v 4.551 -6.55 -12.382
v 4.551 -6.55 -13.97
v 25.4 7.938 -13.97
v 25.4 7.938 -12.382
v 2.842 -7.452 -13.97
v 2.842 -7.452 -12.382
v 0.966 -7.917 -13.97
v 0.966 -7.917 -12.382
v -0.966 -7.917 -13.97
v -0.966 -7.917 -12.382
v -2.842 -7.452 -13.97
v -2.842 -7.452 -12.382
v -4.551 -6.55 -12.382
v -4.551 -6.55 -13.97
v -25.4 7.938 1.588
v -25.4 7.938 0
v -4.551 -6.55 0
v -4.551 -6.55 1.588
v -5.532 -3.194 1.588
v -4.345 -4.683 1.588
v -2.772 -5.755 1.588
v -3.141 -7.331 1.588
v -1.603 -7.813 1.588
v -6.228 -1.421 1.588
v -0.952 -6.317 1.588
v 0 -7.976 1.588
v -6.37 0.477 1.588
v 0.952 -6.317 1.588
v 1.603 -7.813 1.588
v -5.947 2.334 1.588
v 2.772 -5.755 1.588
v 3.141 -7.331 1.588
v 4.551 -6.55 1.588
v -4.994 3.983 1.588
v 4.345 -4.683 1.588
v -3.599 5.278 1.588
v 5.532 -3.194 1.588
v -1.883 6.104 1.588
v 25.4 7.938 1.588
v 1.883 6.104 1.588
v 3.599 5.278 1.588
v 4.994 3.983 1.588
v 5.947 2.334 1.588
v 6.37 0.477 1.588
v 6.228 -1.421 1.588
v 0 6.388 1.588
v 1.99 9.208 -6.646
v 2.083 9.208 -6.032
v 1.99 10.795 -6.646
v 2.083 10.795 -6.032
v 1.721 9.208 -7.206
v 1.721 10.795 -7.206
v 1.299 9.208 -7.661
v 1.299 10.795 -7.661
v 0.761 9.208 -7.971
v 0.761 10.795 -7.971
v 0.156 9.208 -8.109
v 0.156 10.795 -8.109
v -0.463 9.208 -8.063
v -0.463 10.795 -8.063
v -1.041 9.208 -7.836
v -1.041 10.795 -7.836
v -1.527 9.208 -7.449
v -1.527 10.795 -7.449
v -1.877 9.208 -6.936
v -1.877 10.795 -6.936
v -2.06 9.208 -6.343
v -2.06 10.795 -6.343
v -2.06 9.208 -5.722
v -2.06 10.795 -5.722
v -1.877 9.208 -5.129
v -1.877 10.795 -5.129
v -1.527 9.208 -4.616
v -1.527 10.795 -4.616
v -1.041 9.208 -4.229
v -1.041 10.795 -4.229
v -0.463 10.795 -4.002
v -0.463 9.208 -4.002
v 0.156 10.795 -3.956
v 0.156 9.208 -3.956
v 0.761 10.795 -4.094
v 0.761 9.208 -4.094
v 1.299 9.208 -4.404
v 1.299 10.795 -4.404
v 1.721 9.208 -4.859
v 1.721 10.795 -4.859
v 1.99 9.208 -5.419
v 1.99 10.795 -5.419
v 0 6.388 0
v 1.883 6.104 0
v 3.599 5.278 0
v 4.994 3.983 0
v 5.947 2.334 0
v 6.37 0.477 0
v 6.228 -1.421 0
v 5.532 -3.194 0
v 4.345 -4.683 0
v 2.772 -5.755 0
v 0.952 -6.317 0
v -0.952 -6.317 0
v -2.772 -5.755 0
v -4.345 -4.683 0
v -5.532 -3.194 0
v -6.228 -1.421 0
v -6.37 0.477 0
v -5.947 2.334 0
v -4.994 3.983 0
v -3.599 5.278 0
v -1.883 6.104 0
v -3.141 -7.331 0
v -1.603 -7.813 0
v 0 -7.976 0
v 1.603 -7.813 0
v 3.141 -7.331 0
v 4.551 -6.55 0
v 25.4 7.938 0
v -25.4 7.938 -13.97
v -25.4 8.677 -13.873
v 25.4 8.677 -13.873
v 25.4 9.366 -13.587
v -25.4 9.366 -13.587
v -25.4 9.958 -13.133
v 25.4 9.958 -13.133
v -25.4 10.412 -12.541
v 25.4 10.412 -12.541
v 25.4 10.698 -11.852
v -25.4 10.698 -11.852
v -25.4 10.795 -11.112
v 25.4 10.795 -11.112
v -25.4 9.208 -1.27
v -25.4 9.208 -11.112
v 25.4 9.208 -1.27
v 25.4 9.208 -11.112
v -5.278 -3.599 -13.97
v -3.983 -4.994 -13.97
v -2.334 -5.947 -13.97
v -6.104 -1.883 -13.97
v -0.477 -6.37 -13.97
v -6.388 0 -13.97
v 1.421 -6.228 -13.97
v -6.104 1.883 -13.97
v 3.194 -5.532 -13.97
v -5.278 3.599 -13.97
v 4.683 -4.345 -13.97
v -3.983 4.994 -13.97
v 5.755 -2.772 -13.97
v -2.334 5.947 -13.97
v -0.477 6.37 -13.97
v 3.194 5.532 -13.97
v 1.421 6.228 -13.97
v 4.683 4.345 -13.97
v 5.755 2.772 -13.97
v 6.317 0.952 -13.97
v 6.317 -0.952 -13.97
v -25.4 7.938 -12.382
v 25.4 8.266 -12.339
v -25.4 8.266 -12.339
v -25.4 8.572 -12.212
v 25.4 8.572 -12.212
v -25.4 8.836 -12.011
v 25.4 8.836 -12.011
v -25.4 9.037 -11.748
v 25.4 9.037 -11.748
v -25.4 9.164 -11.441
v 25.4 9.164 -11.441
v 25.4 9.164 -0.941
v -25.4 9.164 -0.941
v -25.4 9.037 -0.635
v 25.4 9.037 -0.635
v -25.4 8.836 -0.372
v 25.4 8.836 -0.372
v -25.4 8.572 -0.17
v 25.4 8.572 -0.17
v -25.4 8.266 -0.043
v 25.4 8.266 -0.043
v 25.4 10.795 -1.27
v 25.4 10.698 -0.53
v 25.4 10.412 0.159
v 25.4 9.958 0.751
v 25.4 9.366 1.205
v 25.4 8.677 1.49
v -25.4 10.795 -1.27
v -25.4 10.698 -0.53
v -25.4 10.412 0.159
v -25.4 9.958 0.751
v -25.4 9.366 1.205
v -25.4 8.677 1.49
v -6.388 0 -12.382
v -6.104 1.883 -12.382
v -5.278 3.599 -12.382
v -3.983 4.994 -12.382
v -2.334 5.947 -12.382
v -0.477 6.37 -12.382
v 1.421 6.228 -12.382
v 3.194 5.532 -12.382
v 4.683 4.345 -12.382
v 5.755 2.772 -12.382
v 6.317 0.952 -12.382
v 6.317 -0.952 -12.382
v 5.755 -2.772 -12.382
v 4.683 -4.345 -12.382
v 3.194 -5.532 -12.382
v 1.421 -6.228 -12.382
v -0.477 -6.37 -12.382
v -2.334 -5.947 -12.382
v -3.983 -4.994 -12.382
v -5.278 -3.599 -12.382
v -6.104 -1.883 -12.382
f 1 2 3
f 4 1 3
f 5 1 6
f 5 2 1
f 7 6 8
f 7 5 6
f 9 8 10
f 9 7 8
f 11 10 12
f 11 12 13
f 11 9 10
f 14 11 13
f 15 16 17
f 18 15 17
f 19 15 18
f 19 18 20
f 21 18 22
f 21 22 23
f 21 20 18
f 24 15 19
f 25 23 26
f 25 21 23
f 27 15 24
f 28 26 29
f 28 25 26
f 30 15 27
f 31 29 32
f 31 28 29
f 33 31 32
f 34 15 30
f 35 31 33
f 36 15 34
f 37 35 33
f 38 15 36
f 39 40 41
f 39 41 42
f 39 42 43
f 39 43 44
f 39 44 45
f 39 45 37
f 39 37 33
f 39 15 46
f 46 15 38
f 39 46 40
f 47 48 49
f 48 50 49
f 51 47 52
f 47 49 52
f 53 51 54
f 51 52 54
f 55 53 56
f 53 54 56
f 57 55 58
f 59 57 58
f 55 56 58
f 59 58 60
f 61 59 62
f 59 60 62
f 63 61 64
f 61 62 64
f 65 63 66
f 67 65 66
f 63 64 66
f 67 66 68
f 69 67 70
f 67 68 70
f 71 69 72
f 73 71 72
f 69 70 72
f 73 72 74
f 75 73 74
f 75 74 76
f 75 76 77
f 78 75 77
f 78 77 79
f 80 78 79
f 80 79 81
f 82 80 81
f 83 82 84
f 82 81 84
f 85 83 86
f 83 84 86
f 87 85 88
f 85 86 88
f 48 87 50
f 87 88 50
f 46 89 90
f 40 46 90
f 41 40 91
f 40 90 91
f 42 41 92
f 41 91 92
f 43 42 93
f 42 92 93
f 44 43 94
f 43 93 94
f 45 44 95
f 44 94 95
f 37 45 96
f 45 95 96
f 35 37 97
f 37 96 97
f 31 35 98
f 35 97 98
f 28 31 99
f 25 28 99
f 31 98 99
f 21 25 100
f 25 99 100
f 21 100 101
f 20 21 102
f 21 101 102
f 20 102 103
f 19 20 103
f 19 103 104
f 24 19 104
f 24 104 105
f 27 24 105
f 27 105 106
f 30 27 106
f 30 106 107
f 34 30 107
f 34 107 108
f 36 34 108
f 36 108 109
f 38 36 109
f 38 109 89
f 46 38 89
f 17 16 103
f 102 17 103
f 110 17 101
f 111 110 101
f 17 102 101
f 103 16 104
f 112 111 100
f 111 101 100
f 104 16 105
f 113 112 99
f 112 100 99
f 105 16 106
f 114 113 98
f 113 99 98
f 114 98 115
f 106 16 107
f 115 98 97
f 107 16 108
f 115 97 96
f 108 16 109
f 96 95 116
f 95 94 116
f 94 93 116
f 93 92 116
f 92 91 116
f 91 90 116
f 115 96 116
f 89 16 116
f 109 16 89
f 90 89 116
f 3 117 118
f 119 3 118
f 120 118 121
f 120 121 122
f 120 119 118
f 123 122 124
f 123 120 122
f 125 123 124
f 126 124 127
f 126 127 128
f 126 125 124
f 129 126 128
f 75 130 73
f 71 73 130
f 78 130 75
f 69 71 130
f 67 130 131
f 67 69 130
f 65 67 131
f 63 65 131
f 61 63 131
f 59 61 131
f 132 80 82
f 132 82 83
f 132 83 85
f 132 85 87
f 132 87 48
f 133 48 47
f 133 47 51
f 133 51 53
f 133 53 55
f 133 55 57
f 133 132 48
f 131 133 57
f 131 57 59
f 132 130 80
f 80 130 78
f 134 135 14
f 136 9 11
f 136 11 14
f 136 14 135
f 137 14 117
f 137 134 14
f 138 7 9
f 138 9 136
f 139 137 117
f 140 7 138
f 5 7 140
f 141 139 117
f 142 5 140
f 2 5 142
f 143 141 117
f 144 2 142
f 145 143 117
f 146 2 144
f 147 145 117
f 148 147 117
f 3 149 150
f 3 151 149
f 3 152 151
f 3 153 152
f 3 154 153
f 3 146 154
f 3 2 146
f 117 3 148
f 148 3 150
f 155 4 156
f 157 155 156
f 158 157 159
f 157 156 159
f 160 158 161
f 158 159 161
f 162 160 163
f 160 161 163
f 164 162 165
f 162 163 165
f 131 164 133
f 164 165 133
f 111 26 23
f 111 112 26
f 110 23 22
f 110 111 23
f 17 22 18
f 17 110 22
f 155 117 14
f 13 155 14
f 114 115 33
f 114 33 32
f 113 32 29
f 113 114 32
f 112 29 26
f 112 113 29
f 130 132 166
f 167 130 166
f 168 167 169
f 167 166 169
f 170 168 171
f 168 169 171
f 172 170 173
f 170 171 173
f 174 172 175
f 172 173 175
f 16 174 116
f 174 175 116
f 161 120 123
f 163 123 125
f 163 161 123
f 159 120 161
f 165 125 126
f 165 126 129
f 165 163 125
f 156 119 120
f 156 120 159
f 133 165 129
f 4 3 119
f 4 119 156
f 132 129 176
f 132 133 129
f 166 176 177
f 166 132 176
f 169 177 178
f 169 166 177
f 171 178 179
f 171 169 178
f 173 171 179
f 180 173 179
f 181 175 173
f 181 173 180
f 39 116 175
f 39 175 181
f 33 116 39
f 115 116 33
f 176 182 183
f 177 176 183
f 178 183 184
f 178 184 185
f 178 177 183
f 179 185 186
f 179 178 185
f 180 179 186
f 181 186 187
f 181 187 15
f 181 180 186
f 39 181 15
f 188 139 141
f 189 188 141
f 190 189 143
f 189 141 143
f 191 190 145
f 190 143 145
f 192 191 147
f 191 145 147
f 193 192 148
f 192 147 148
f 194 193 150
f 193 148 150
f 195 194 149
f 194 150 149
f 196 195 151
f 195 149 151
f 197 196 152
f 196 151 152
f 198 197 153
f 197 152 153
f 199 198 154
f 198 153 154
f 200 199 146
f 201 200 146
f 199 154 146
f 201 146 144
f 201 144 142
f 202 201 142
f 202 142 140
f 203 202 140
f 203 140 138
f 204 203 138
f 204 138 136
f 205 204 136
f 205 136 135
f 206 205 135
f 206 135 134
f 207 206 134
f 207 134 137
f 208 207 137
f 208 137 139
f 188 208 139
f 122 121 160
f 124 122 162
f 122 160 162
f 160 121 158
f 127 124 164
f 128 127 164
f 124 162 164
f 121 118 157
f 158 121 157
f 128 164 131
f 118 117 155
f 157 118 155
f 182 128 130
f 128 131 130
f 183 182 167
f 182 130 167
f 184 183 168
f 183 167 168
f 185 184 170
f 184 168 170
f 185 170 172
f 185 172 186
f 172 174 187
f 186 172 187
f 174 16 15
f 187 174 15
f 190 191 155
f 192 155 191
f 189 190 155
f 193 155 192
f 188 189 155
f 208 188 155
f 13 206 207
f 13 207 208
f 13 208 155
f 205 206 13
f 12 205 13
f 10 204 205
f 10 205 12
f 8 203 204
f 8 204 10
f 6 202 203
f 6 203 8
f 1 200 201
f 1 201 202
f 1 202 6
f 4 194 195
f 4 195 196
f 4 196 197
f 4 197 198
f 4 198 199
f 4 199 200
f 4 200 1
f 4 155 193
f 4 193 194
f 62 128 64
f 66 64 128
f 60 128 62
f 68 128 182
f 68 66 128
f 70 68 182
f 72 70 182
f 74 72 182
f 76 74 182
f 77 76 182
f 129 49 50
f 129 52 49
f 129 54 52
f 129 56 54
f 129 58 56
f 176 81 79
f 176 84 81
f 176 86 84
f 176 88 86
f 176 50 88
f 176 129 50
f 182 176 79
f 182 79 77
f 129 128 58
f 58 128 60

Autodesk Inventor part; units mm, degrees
ref_plane "YZ Plane" through (0, 0, 0) normal (1, 0, 0) x (0, 1, 0)
ref_plane "XZ Plane" through (0, 0, 0) normal (0, 1, 0) x (-1, 0, 0)
ref_plane "XY Plane" through (0, 0, 0) normal (0, 0, 1) x (1, 0, 0)
sketch "Sketch1" plane through (0, 0, 0) normal (0, 0, 1) x (1, 0, 0)
  arc A0 (0, 6.3881) -> (0, -6.3881) centre (0, 0) ccw
  line L0 (-25.4, 7.9375) -> (-4.5511, -6.5496)
  line L1 (0, 7.9375) -> (0, -13.1033) construction
  line L2 (-25.4, 7.9375) -> (0, 7.9375)
  arc A1 (-4.5511, -6.5496) -> (0, -7.9756) centre (0, 0) ccw
  arc A2 (0, -6.3881) -> (0, 6.3881) centre (0, 0) ccw
  line L3 (25.4, 7.9375) -> (4.5511, -6.5496)
  line L4 (25.4, 7.9375) -> (0, 7.9375)
  arc A3 (0, -7.9756) -> (4.5511, -6.5496) centre (0, 0) ccw
  dimension "d0" = 12.7762
  dimension "d1" = 7.9375
  dimension "d2" = 25.4
  dimension "d3" = 1.5875
extrude "Plate1" add sketch "Sketch1" along normal blind 1.5875
sketch "Sketch2" plane through (25.4, 9.2075, -1.27) normal (0, 1, 0) x (-1, 0, 0)
  line L0 (50.8, 0) -> (0, 0)
  line L1 (0, 0) -> (0, -9.8425)
  line L2 (0, -9.8425) -> (50.8, -9.8425)
  line L3 (50.8, -9.8425) -> (50.8, 0)
edge flange "Flange1" height 12.7 angle 90 thickness 1.5875 bend radius 1.27 thickness toward (0, 1, 0) relief tear relief width 1.5875 relief depth 0.7937 edges at (-12.7, 7.9375, 0) wall of the first edge with corners at (-25.4, 9.2075, -1.27) (25.4, 9.2075, -1.27) (25.4, 9.2075, -11.1125) (-25.4, 9.2075, -11.1125)
bend "Bend1"
corner "Corner1"
sketch "Sketch3" plane through (-25.4, 10.795, -11.1125) normal (0, 1, 0) x (1, 0, 0)
  line L0 (0, -9.8425) -> (50.8, -9.8425) projected
  line L1 (50.8, 0) -> (50.8, -9.8425) projected
  line L2 (25.4, -6.2418) -> (25.4, -0.3175) construction
  circle A0 centre (25.4, -5.08) radius 2.0828
  dimension "d35" = 4.1656
  dimension "d36" = 4.7625
  dimension "d37" = 25.4
extrude "Cut1" cut sketch "Sketch3" against normal blind 1.5875
sketch "Sketch4" plane through (25.4, 7.9375, -12.3825) normal (0, 0, -1) x (-1, 0, 0)
  line L0 (50.8, 0) -> (0, 0)
  line L1 (0, 0) -> (0, -16.2306)
  line L2 (0, -16.2306) -> (50.8, -16.2306)
  line L3 (50.8, -16.2306) -> (50.8, 0)
edge flange "Flange2" height 19.0881 angle 90 thickness 1.5875 bend radius 1.27 thickness toward (0, 0, -1) relief tear relief width 1.5875 relief depth 0.7937 edges at (0, 9.2075, -11.1125) wall of the first edge with corners at (-25.4, 7.9375, -12.3825) (25.4, 7.9375, -12.3825) (25.4, -8.2931, -12.3825) (-25.4, -8.2931, -12.3825)
bend "Bend2"
corner "Corner2"
sketch "Sketch5" plane through (25.4, -8.2931, -13.97) normal (0, 0, -1) x (-1, 0, 0)
  line L0 (50.8, 16.2306) -> (0, 16.2306) projected
  line L1 (0, 0) -> (0, 16.2306) projected
  line L2 (50.8, 0) -> (0, 0) projected
  line L3 (50.8, 16.2306) -> (50.8, 0) projected
  circle A0 centre (25.4, 8.2931) radius 6.3881 projected
  line L4 (50.8, 16.2306) -> (29.9511, 1.7435) projected
  line L5 (0, 16.2306) -> (50.8, 16.2306) projected
  line L6 (20.8489, 1.7435) -> (0, 16.2306) projected
  arc A1 (20.8489, 1.7435) -> (29.9511, 1.7435) centre (25.4, 8.2931) ccw projected
extrude "Cut2" cut sketch "Sketch5" against normal blind 1.5875 contours L3 L2 L1 L6 A1 L4 | A0
equation "\"d37\" = d2"
equation "\"d18\" = Thickness"
equation "\"d49\" = Thickness"
equation "\"d5\" = BendReliefWidth"
equation "\"d6\" = BendReliefDepth"
equation "\"d7\" = MinimumRemnant"
equation "\"d8\" = BendRadius"
equation "\"d12\" = CornerReliefSize"
equation "\"d13\" = GapSize"
equation "\"d14\" = JacobiRadiusSize"
equation "\"d39\" = BendReliefWidth"
equation "\"d40\" = BendReliefDepth"
equation "\"d41\" = MinimumRemnant"
equation "\"d42\" = BendRadius"
equation "\"d46\" = CornerReliefSize"
equation "\"d47\" = GapSize"
equation "\"d48\" = JacobiRadiusSize"
equation "\"BendRadius\" = Thickness"
equation "\"BendReliefWidth\" = Thickness"
equation "\"BendReliefDepth\" = 0.5 * Thickness"
equation "\"CornerReliefSize\" = 4 * Thickness"
equation "\"MinimumRemnant\" = 2 * Thickness"
equation "\"TransitionRadius\" = BendRadius"
equation "\"JacobiRadiusSize\" = BendRadius"
equation "\"GapSize\" = Thickness"
equation "\"d4\" = BendRadius"
equation "\"Thickness\" = 1.5875"
properties part number "Pipe to Gas Spring Connector (9417K91)" material "Aluminum"
